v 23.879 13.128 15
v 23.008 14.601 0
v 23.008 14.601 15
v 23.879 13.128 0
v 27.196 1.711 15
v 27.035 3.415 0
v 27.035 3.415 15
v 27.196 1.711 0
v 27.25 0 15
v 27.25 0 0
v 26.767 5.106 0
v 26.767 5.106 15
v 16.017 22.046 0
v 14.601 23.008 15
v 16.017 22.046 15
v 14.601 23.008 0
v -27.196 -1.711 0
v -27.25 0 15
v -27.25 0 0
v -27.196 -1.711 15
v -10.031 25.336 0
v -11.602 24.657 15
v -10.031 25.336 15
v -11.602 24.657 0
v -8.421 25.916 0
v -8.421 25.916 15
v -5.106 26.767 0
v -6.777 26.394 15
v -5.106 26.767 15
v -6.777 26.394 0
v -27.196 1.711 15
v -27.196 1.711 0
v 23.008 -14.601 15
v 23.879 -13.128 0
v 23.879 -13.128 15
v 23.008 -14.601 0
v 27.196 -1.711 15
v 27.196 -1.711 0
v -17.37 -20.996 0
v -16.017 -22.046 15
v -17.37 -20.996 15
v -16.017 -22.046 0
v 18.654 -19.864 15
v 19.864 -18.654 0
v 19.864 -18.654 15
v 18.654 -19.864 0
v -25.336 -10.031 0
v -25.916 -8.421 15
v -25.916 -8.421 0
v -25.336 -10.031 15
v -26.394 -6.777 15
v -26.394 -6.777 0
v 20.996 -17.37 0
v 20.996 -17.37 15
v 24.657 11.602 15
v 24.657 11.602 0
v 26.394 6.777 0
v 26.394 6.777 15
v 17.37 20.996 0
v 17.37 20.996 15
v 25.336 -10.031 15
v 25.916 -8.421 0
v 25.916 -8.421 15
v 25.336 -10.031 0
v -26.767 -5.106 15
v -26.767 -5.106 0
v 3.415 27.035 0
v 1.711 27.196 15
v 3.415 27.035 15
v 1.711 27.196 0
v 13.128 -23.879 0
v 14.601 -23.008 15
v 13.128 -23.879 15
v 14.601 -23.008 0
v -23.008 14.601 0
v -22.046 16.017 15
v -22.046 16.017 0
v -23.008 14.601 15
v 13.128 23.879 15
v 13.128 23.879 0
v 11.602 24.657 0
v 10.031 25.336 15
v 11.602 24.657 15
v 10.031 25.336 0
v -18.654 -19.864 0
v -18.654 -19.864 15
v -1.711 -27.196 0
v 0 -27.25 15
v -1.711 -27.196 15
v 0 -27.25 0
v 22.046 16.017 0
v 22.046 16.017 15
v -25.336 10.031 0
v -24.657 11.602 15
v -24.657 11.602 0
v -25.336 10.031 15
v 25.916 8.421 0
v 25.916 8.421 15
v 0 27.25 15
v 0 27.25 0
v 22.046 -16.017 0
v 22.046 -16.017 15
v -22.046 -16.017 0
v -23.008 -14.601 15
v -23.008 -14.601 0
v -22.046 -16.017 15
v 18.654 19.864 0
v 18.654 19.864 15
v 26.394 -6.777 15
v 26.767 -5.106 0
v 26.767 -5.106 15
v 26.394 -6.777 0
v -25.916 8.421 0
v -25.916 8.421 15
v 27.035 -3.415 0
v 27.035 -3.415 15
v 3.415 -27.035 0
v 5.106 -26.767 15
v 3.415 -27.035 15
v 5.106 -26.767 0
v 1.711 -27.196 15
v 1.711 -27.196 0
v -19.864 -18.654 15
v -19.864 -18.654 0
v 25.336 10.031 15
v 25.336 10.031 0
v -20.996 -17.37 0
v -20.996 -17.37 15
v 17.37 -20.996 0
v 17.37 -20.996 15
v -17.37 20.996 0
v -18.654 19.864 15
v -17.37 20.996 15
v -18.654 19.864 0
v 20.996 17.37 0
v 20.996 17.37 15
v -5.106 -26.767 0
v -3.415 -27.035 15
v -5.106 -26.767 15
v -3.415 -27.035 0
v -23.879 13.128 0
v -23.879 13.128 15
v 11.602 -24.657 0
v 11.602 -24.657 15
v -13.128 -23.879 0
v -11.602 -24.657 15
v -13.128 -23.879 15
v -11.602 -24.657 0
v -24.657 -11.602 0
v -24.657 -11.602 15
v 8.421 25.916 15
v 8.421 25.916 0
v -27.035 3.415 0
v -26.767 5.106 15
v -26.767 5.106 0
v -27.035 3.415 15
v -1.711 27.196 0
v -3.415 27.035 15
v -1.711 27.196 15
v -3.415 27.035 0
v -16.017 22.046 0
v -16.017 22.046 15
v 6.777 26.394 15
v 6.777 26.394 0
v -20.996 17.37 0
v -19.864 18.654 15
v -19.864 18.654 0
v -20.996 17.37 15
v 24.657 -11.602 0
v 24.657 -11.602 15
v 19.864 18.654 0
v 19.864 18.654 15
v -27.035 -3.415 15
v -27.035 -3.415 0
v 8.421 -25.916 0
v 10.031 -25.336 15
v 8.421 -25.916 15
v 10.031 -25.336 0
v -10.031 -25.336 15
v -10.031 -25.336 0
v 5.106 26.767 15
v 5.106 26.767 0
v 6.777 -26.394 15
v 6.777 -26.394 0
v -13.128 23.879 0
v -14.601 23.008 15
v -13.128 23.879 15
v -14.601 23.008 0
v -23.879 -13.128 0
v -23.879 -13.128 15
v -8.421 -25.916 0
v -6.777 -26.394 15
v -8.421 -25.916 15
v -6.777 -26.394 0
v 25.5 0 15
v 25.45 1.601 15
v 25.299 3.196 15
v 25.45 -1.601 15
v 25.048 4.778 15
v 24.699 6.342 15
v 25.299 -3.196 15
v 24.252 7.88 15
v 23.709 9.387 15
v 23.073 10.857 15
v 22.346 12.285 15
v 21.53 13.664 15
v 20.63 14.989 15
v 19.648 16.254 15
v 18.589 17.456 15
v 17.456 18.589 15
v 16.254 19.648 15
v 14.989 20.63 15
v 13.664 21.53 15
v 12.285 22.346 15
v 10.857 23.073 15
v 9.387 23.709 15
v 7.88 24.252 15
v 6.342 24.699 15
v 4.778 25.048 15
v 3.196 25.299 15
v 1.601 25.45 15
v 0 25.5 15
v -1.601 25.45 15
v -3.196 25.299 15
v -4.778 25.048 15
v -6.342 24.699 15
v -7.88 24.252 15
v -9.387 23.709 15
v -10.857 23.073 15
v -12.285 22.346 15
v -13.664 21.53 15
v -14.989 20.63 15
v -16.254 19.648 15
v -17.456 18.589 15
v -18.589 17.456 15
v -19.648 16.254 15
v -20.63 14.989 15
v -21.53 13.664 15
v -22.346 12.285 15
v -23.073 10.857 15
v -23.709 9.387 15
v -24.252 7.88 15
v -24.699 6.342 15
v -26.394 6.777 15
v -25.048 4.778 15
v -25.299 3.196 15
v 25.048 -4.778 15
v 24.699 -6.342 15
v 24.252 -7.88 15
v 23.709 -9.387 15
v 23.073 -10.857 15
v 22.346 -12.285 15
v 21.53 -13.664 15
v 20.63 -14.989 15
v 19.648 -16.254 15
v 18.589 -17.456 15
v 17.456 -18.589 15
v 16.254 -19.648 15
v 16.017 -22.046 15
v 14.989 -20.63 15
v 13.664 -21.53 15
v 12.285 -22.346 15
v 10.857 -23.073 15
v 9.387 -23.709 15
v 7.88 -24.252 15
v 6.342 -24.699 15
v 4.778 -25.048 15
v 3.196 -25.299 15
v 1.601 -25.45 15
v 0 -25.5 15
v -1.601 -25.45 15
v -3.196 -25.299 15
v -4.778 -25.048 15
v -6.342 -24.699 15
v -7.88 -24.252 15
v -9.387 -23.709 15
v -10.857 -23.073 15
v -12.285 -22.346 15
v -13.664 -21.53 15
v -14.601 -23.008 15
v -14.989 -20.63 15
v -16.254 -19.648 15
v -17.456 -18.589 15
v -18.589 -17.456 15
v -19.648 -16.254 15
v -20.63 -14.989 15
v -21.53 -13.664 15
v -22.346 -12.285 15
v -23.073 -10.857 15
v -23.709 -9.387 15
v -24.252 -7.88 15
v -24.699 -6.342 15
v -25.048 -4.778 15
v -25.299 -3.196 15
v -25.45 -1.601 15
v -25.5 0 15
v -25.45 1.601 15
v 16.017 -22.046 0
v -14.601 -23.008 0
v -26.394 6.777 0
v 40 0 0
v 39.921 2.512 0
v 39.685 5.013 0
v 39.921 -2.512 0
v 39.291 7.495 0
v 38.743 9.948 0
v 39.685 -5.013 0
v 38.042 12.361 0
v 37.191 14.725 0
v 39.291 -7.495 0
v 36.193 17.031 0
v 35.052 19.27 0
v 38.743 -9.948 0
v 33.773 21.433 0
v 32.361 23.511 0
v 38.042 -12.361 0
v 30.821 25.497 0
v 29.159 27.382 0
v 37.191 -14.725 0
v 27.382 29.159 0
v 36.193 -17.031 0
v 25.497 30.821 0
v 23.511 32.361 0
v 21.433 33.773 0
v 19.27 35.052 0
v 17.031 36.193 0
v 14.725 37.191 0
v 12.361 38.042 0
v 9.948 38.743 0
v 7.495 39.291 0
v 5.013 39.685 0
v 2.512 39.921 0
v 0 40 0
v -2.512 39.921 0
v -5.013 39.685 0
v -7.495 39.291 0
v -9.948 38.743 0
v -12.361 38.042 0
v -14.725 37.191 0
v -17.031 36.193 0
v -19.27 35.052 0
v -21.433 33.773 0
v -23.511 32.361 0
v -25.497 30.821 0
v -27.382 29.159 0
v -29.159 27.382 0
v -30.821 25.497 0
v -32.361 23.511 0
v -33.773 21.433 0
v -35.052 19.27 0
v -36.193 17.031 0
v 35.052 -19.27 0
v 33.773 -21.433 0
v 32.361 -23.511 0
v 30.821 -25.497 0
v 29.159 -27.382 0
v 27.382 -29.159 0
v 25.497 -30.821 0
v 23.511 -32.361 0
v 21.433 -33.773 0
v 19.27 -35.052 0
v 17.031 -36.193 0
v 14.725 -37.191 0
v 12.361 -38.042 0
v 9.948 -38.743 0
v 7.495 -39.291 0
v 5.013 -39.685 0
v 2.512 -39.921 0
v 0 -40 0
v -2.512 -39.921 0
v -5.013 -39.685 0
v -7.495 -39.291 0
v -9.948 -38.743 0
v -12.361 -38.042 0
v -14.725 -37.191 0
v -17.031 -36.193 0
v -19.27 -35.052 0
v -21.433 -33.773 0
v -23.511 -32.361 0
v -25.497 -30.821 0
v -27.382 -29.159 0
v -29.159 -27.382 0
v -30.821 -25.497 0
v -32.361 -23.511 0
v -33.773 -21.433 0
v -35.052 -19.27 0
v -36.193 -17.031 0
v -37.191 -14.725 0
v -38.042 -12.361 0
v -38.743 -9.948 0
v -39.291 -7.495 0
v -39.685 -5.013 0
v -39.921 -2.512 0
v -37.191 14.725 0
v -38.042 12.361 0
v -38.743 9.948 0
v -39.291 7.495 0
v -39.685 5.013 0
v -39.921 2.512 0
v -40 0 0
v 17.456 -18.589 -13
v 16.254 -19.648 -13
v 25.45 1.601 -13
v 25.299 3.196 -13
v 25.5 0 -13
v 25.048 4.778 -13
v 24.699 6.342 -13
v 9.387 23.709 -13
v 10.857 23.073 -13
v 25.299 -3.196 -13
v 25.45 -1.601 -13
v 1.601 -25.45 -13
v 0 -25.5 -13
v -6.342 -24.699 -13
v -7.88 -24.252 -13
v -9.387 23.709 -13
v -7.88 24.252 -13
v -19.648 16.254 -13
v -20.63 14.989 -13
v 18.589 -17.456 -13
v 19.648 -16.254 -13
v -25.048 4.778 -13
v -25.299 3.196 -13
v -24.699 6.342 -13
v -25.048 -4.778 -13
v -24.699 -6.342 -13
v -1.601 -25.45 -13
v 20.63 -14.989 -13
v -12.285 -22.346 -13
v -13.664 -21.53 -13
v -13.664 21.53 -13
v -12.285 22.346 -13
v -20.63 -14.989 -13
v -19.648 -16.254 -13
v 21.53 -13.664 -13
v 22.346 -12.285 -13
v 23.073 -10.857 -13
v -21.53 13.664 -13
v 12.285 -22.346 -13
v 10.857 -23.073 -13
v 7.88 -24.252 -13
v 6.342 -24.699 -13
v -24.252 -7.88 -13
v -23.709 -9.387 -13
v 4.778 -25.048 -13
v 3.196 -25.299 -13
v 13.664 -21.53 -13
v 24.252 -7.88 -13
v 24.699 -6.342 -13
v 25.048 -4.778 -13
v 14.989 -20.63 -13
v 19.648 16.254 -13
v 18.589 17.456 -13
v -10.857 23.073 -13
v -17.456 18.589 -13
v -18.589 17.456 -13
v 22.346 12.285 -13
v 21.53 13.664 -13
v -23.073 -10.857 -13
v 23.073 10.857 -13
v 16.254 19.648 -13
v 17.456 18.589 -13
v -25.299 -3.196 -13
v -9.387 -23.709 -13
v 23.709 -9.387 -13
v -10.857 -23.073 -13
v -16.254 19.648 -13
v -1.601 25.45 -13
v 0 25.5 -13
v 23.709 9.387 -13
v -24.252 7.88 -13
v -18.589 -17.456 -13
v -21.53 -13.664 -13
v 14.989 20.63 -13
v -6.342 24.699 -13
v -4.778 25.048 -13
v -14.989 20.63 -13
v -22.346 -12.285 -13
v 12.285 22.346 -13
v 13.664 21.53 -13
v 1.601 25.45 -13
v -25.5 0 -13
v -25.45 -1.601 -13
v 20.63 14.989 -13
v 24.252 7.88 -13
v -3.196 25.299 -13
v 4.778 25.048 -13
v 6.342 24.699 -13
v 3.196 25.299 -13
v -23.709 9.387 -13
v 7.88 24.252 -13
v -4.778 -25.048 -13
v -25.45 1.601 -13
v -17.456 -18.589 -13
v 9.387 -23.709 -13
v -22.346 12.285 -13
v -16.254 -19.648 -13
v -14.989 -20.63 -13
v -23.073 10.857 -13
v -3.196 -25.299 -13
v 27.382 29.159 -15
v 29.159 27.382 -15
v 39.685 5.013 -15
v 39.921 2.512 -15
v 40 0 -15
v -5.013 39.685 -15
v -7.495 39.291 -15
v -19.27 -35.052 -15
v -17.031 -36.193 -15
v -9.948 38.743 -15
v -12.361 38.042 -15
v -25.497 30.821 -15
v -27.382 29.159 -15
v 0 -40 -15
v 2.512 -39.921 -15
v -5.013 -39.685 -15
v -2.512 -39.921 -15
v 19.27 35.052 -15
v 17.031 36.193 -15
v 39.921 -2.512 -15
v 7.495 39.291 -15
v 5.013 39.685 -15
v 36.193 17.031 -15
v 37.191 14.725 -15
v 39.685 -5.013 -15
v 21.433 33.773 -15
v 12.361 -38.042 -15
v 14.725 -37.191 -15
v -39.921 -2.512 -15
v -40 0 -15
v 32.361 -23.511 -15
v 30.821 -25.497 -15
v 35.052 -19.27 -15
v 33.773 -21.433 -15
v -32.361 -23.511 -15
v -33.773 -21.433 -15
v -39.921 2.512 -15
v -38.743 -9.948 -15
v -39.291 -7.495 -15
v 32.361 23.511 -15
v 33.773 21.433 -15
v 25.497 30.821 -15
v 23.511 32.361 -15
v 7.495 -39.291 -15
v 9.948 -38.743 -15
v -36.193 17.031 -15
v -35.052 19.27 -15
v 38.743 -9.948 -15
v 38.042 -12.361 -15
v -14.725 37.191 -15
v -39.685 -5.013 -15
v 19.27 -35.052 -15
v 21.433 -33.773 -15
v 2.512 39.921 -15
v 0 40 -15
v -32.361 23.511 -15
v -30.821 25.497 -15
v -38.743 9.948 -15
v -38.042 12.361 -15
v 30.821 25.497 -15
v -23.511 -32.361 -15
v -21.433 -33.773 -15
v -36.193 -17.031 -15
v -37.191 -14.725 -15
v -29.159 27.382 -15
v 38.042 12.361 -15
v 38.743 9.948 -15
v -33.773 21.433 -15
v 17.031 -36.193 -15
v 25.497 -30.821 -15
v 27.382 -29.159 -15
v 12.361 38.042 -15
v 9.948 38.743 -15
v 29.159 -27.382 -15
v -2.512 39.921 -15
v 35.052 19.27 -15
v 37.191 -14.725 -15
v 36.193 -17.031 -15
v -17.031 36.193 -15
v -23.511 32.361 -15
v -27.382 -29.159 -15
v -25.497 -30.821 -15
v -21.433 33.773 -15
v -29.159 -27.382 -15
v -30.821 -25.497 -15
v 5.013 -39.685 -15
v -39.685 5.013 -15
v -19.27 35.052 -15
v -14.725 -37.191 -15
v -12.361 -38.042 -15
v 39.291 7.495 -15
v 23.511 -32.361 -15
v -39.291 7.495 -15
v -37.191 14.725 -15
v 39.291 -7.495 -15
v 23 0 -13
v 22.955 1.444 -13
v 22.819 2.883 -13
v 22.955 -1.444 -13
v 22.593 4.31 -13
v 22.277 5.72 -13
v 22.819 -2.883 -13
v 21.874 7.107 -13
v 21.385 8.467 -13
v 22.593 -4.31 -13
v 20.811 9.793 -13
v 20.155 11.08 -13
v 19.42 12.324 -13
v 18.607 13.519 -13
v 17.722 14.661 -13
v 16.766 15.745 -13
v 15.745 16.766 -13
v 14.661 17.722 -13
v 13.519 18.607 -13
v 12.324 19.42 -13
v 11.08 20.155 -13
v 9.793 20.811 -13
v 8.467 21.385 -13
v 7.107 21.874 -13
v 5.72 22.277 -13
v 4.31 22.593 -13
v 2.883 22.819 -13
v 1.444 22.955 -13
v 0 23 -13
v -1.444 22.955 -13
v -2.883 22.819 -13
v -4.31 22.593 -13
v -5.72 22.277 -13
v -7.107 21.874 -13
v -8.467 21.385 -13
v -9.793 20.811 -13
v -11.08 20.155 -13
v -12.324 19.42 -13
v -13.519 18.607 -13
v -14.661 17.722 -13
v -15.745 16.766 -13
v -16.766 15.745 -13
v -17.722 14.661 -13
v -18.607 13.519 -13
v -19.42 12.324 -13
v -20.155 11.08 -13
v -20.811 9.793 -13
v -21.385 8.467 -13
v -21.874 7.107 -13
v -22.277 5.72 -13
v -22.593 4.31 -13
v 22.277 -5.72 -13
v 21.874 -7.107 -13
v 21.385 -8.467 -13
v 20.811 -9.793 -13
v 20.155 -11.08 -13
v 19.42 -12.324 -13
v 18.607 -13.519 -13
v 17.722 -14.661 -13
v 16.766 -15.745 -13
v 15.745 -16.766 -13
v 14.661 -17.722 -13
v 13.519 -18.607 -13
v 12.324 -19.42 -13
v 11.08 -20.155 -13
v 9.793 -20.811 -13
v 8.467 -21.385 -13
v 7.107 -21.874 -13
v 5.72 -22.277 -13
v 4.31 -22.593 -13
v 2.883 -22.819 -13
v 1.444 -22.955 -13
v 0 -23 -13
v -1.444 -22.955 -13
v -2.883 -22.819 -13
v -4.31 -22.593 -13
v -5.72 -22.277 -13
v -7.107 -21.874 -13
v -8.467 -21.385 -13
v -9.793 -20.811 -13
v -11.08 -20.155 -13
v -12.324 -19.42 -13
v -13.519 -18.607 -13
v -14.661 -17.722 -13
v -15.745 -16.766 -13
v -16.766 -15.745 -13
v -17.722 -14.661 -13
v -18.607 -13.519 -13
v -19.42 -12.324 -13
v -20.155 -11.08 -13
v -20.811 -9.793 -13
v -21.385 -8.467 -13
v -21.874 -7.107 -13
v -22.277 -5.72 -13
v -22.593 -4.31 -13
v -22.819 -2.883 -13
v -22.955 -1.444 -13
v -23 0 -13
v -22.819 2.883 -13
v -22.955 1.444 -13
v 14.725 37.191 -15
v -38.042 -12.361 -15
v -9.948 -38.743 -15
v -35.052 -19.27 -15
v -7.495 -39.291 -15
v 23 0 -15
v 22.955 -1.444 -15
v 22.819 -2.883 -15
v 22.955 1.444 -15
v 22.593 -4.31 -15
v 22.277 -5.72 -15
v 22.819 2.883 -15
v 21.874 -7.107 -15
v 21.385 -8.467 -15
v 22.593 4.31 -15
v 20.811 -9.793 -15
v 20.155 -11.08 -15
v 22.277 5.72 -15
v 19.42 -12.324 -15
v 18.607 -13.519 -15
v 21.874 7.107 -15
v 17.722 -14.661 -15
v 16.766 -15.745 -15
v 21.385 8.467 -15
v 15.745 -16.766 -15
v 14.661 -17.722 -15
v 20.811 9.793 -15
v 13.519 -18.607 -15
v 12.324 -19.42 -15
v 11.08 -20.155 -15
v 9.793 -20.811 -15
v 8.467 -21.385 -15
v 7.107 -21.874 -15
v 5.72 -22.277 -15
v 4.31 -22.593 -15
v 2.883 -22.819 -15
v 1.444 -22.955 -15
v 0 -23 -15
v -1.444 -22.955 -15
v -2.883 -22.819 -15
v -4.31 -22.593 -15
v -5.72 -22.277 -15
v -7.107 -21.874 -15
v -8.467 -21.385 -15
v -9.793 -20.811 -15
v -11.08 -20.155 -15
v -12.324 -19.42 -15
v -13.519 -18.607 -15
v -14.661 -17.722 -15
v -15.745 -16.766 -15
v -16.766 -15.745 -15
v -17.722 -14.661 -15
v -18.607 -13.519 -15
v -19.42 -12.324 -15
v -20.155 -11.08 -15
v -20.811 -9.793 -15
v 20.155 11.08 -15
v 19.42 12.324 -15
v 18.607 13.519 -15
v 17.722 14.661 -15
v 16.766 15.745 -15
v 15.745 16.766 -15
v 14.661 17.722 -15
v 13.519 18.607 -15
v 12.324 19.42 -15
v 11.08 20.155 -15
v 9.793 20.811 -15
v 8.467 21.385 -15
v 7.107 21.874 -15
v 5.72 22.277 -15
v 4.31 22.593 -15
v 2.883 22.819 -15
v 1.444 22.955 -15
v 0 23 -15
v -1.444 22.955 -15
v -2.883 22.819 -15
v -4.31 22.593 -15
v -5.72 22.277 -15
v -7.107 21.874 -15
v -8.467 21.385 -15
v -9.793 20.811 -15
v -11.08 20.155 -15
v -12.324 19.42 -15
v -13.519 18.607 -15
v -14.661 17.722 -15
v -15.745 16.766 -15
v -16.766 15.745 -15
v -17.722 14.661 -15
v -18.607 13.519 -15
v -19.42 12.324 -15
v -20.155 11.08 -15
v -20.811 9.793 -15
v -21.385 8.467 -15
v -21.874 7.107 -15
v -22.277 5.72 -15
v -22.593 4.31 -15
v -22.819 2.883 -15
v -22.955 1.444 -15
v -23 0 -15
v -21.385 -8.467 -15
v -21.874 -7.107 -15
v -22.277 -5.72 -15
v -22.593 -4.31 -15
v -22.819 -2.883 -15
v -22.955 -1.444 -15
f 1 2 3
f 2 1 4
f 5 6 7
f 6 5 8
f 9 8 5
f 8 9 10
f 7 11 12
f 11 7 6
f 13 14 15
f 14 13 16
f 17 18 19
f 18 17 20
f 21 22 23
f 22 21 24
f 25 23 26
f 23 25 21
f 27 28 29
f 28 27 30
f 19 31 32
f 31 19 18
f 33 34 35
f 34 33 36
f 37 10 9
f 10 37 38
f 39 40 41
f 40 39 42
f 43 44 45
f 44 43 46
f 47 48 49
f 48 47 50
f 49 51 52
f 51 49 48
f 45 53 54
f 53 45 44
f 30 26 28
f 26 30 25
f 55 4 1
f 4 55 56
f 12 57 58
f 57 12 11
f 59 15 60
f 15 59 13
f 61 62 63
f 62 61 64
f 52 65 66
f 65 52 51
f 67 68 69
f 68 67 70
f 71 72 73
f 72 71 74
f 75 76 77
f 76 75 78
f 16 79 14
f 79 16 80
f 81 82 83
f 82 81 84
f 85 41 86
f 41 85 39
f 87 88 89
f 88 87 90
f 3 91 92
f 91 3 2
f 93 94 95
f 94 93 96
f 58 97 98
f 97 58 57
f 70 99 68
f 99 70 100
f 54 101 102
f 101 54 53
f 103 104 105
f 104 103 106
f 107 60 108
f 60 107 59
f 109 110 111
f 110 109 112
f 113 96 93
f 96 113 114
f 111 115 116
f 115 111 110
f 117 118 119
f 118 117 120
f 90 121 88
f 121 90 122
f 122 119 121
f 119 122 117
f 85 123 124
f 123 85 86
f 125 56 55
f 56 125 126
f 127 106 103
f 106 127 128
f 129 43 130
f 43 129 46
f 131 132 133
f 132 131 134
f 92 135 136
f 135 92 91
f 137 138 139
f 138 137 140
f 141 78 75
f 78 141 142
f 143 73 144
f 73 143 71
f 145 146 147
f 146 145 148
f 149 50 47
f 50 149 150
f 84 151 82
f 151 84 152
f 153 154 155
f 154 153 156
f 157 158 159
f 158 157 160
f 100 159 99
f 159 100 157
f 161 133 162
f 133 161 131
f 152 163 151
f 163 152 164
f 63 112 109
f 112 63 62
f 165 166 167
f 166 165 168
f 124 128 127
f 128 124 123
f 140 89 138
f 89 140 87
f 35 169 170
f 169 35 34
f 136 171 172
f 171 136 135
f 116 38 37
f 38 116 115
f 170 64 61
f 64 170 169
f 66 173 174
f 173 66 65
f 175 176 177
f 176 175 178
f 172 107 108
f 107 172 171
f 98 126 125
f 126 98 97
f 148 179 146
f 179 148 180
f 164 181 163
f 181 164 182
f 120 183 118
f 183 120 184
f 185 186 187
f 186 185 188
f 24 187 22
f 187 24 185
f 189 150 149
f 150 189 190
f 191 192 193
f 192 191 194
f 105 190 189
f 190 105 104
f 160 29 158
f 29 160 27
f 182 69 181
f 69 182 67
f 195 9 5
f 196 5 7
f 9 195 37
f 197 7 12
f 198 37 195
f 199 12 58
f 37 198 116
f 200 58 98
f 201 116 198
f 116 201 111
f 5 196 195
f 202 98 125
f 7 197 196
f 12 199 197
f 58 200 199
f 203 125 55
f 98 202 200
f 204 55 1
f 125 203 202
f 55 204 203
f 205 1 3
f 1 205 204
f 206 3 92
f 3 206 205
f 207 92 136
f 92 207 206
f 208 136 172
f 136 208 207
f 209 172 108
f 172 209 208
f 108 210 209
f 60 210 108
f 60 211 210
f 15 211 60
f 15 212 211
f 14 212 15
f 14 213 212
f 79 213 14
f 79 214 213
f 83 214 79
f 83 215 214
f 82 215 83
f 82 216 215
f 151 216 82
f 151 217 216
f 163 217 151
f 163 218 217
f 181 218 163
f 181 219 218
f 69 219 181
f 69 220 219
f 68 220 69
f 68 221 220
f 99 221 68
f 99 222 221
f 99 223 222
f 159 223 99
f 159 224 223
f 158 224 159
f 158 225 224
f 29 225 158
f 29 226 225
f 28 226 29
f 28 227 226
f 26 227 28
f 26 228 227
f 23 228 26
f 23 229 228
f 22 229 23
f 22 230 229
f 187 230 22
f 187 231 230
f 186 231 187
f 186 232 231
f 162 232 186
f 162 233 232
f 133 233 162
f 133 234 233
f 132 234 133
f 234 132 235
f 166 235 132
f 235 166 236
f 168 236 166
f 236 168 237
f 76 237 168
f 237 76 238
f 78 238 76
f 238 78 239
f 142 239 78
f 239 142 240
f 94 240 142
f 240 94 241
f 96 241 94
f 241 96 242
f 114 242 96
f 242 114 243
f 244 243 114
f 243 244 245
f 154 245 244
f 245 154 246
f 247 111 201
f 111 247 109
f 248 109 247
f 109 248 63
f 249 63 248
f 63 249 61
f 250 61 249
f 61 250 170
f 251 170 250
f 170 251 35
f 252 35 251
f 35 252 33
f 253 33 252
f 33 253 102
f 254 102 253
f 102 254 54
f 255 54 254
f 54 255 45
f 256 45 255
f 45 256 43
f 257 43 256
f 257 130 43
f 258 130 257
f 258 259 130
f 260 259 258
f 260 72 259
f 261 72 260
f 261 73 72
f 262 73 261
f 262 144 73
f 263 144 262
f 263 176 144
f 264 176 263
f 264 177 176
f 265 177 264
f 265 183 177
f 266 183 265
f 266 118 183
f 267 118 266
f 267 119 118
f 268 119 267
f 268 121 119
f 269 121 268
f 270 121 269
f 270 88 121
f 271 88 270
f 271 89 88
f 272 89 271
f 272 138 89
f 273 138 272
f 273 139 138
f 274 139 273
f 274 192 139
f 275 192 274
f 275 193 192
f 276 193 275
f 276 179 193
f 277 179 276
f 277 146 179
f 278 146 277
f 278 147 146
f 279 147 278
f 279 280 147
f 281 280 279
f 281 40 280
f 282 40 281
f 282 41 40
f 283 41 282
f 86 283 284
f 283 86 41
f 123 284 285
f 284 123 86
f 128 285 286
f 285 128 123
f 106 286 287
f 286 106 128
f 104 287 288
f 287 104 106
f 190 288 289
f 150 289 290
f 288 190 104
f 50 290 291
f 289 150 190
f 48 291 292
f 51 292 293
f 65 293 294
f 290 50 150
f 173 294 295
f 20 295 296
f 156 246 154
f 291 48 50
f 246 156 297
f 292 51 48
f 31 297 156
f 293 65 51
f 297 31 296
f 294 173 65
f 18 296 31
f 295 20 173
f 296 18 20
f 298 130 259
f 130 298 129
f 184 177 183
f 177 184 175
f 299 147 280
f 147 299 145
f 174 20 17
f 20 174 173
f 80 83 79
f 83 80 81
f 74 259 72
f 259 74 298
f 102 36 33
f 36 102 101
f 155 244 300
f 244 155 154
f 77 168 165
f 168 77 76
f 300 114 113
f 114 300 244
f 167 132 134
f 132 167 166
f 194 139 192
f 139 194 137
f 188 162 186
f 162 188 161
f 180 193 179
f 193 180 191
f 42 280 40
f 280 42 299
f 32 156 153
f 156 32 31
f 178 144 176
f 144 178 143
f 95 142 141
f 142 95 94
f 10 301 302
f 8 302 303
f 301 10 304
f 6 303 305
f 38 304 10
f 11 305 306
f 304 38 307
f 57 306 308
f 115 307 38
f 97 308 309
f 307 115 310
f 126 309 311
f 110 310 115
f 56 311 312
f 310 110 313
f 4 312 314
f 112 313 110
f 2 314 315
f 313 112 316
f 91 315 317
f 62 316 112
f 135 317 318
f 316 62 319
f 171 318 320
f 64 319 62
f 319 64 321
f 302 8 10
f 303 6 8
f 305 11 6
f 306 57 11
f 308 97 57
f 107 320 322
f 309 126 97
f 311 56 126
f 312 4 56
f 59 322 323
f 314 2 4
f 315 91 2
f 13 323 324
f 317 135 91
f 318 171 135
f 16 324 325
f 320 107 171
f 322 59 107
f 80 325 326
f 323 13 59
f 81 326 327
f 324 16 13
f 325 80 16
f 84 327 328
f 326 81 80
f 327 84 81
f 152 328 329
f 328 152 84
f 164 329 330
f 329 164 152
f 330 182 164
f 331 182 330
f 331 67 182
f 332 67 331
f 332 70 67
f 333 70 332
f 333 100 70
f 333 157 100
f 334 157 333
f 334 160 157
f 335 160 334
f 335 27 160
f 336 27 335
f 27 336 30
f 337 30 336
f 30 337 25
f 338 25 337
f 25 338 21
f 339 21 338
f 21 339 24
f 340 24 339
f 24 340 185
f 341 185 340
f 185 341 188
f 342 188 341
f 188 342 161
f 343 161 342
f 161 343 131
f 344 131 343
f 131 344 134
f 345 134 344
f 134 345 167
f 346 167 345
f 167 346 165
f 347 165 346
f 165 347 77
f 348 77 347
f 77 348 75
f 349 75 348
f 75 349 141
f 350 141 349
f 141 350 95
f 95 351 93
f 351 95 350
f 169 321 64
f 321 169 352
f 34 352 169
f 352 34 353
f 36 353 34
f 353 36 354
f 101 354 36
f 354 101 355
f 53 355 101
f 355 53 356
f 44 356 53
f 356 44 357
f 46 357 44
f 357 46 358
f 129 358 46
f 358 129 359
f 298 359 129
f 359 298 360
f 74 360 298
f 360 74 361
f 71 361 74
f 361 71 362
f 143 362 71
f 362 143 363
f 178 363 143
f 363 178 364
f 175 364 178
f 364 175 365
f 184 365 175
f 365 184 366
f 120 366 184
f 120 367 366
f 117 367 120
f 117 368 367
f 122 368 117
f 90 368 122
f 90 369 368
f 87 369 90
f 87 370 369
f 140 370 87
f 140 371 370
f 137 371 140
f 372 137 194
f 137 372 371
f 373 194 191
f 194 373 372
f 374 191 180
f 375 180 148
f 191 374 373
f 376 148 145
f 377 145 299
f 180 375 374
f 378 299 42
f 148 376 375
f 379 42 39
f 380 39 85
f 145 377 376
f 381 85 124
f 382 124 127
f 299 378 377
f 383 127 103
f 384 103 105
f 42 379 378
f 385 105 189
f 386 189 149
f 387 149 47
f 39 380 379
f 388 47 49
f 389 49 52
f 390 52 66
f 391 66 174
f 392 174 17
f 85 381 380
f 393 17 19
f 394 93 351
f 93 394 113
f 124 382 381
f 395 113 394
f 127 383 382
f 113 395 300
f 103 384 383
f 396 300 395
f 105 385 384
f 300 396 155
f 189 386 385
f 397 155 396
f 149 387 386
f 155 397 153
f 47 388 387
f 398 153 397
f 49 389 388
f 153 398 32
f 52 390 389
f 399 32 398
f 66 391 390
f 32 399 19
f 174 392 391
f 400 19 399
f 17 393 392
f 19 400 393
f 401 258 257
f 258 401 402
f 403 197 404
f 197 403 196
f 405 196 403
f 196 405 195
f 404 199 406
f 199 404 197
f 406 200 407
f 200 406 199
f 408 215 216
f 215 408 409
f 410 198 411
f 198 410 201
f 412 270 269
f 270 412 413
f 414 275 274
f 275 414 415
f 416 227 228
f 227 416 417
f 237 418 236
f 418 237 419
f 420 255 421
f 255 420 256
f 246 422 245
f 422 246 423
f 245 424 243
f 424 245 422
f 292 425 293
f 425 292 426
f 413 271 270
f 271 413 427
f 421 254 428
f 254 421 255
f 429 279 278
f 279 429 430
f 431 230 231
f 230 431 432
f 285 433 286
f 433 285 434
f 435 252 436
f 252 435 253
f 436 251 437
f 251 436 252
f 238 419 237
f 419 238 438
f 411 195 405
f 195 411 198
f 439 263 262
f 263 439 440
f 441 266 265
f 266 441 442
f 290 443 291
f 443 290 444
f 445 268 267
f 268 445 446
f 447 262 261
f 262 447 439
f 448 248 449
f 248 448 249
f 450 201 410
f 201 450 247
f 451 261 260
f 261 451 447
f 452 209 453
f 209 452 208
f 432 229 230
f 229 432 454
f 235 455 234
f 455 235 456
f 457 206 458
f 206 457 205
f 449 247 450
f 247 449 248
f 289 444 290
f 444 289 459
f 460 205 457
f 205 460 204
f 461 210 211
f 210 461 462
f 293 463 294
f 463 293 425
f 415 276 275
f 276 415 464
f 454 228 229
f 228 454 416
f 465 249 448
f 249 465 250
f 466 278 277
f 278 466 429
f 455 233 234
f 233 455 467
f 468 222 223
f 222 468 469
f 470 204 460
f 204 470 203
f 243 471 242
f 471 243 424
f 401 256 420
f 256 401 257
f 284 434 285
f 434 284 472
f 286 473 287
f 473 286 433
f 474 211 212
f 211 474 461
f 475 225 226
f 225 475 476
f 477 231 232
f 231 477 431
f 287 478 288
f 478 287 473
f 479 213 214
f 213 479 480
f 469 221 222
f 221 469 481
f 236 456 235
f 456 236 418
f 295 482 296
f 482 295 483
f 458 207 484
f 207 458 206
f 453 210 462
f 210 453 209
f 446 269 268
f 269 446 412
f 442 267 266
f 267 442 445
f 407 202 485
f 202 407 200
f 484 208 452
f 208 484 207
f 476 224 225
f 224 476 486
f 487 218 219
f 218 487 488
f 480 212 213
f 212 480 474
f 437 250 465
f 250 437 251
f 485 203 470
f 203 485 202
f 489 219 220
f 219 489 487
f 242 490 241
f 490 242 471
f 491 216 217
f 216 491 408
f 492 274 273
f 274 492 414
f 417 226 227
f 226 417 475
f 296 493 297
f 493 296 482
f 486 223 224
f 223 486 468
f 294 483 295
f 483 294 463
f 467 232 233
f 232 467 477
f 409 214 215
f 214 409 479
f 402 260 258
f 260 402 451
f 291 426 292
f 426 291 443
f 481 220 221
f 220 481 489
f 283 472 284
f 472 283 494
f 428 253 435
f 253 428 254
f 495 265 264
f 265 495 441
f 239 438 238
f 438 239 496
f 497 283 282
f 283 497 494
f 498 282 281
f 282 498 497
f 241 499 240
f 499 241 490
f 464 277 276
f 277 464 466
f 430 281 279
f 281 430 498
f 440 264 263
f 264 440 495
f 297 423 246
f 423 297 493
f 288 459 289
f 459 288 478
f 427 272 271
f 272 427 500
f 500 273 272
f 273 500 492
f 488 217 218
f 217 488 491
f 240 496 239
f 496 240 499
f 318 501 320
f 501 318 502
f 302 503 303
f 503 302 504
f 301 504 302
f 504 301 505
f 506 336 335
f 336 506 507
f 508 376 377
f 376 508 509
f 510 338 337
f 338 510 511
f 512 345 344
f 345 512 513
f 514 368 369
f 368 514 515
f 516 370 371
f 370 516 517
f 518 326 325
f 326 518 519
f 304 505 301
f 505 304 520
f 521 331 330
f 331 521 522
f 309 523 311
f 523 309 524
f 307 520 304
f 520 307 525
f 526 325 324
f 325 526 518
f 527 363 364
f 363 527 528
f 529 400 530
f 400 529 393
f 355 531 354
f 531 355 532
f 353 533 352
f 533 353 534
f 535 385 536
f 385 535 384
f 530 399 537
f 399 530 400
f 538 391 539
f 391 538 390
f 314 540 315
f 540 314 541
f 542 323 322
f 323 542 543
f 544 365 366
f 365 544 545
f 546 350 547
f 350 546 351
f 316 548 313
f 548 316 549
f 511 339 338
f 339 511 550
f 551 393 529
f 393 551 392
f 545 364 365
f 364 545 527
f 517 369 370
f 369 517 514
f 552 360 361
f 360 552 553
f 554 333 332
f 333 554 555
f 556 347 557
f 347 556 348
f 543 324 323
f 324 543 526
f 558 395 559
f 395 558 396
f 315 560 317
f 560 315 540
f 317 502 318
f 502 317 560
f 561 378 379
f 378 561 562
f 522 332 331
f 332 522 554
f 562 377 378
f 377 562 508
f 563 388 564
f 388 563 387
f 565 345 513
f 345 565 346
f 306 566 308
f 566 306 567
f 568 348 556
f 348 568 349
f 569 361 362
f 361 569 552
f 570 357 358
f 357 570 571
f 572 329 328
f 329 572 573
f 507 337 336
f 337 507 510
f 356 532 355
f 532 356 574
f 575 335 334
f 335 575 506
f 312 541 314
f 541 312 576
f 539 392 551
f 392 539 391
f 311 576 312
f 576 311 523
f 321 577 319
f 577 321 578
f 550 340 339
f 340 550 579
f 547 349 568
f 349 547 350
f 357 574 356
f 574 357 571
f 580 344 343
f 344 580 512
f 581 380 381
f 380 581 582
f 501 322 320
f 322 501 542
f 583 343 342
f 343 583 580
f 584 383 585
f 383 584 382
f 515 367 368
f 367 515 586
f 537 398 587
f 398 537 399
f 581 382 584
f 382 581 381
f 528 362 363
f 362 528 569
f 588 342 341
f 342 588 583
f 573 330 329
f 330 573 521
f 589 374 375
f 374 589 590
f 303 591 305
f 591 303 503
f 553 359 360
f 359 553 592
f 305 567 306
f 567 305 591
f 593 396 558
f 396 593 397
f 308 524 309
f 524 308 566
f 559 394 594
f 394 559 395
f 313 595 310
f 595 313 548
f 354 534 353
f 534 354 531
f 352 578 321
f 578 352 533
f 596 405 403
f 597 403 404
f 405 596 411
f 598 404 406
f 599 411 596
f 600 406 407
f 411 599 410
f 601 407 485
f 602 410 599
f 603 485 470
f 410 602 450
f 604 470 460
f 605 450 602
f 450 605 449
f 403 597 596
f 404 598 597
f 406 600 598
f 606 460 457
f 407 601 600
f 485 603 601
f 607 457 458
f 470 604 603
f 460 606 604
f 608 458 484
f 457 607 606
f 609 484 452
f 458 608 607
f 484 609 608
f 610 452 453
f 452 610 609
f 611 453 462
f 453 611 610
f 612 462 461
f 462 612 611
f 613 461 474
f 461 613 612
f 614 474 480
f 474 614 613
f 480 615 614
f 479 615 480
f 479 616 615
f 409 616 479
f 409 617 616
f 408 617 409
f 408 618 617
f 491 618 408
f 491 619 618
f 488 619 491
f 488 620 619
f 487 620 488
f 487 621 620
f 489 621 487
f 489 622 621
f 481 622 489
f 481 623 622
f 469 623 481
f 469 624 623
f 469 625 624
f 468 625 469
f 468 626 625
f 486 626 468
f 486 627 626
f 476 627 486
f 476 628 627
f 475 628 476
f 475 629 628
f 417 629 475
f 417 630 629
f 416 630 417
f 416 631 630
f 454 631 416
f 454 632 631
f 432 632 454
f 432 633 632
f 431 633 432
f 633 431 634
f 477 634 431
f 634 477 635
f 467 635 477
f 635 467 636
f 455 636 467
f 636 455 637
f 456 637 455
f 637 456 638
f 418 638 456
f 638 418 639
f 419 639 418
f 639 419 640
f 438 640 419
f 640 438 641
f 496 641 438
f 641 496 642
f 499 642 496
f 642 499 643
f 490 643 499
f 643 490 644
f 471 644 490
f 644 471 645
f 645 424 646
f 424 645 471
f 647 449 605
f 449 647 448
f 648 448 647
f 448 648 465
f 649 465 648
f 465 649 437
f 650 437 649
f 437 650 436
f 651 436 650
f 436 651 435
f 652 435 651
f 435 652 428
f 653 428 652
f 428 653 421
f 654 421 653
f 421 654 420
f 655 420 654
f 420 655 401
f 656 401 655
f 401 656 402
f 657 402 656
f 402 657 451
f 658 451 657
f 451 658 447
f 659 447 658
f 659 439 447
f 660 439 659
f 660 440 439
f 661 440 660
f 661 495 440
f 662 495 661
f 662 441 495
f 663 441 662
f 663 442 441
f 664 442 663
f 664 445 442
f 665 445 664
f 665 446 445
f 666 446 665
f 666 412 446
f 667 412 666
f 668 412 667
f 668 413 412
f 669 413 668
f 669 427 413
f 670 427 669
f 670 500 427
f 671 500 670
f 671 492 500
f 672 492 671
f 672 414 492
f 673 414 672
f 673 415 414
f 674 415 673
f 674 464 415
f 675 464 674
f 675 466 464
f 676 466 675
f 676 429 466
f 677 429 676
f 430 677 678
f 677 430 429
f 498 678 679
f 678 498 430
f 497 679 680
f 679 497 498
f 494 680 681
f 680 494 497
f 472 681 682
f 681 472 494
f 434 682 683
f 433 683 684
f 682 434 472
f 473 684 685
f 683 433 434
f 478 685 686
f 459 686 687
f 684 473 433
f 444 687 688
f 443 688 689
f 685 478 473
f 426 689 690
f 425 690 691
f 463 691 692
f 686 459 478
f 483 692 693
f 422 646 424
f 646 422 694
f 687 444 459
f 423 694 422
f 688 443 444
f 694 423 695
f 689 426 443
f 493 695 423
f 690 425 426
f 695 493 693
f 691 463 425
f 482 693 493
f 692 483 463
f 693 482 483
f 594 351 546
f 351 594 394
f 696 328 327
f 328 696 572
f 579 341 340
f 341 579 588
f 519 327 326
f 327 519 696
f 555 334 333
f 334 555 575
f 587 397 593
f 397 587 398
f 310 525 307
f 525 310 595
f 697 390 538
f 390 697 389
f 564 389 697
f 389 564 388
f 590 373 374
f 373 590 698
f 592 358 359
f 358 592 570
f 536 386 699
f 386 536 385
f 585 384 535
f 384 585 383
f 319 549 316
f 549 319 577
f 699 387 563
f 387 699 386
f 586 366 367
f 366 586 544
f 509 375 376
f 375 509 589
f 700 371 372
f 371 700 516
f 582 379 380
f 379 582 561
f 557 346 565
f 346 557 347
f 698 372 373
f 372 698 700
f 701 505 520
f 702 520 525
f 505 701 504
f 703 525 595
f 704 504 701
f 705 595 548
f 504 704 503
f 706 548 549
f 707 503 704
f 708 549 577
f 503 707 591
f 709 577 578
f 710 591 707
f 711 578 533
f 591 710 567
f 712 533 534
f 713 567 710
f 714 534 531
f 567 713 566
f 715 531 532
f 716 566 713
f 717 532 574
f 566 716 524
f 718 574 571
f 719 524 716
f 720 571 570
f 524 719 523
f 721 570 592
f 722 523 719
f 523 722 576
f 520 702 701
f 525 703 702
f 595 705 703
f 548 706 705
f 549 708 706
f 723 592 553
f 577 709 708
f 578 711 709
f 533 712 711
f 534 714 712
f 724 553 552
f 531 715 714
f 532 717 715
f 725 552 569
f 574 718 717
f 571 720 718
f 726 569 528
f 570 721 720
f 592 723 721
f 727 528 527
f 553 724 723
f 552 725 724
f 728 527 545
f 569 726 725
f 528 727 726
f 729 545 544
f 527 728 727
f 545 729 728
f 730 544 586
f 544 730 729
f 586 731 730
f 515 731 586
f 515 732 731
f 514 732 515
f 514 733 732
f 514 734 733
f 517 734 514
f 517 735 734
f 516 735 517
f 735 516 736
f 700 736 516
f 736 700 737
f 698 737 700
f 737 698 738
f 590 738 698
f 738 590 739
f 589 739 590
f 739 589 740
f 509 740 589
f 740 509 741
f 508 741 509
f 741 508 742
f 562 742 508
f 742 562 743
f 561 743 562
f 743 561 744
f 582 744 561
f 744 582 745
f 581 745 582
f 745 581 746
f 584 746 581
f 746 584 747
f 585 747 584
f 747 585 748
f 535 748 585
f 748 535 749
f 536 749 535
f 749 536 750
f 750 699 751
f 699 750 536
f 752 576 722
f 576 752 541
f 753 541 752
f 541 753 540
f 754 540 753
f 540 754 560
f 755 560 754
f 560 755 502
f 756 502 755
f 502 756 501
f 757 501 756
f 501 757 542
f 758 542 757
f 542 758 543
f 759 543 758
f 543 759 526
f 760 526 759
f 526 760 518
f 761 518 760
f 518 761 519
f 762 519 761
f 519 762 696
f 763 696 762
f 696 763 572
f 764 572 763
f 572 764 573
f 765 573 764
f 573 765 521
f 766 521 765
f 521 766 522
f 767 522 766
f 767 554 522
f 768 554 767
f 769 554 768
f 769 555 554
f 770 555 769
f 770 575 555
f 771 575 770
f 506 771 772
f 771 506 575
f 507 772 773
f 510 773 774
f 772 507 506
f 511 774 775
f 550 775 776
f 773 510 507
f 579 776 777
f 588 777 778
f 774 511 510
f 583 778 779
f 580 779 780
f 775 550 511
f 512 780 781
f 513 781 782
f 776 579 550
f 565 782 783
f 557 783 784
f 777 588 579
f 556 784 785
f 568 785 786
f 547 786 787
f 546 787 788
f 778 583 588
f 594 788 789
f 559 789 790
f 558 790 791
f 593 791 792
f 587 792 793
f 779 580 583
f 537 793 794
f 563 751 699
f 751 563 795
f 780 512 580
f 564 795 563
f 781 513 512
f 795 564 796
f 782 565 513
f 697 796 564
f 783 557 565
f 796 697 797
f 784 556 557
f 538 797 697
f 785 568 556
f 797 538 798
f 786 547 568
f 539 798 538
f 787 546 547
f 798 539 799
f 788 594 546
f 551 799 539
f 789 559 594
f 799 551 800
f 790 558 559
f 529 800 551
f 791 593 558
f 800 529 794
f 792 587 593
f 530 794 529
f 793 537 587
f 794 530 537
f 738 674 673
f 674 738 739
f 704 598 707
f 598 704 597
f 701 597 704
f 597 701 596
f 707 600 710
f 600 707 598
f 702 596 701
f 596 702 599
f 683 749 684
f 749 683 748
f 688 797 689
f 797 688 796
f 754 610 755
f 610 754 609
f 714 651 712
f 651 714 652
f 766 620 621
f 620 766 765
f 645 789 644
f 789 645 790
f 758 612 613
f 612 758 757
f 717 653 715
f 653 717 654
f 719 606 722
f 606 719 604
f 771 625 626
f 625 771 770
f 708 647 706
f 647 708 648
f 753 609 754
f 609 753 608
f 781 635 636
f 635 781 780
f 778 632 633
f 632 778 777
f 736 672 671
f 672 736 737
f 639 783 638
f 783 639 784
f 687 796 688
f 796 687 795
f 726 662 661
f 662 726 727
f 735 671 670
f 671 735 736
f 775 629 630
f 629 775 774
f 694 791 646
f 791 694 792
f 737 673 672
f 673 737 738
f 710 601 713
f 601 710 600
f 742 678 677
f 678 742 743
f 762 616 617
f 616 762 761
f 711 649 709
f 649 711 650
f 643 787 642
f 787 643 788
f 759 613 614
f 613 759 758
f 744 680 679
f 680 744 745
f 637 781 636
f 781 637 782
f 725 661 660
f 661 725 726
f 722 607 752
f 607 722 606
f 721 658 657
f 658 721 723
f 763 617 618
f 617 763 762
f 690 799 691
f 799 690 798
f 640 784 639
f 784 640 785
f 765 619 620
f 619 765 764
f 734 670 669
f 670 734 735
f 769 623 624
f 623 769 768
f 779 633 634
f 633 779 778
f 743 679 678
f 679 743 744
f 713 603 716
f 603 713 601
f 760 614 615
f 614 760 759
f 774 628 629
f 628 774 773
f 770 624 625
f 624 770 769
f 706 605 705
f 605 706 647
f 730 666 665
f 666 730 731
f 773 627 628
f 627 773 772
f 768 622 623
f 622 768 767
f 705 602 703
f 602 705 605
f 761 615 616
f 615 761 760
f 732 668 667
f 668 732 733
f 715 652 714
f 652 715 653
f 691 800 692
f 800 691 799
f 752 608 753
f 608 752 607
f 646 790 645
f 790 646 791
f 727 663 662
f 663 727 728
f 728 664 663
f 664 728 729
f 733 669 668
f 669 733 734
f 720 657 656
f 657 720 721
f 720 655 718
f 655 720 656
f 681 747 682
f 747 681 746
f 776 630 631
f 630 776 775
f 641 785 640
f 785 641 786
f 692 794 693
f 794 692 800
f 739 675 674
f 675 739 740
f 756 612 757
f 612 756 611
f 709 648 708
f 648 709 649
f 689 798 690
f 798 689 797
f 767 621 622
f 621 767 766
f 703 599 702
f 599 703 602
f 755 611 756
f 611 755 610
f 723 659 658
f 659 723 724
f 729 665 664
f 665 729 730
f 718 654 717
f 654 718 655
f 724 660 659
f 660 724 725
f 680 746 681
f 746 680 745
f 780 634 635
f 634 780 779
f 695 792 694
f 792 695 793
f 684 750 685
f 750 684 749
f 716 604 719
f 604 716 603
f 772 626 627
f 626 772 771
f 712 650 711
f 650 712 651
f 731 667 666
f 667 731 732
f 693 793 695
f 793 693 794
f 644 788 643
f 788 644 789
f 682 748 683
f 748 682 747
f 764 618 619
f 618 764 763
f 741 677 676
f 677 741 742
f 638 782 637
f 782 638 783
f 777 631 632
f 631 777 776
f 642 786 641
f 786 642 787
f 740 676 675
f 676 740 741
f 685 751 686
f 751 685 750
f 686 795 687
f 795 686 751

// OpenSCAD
$fn=100;
r_gat=54.5/2;
k = 0.01;
wand_dikte_in_gat = 1.75;
hoogte_in_gat = 15;

r_lamp=80/2;
wand_dikte_lamp = (r_lamp - r_gat)+wand_dikte_in_gat;
hoogte_lamp = 13;

wand_dikte_lamp_rand = r_gat-wand_dikte_in_gat;
hoogte_lamp_rand = 2;
r_inner_rand = 46 / 2;


difference(){
    cylinder(hoogte_in_gat,r_gat,r_gat);
    translate([0,0,-k/2])
    cylinder(hoogte_in_gat+k,r_gat-wand_dikte_in_gat,r_gat-wand_dikte_in_gat);
}
translate([0,0,-hoogte_lamp])
difference(){
    cylinder(hoogte_lamp,r_lamp,r_lamp);
    translate([0,0,-k/2])
    cylinder(hoogte_lamp+k,r_lamp-wand_dikte_lamp,r_lamp-wand_dikte_lamp);
}

translate([0,0,-hoogte_lamp-hoogte_lamp_rand])
difference(){
    cylinder(hoogte_lamp_rand,r_lamp,r_lamp);
    translate([0,0,-k/2])
    cylinder(hoogte_lamp_rand+k,r_inner_rand,r_inner_rand);
}
